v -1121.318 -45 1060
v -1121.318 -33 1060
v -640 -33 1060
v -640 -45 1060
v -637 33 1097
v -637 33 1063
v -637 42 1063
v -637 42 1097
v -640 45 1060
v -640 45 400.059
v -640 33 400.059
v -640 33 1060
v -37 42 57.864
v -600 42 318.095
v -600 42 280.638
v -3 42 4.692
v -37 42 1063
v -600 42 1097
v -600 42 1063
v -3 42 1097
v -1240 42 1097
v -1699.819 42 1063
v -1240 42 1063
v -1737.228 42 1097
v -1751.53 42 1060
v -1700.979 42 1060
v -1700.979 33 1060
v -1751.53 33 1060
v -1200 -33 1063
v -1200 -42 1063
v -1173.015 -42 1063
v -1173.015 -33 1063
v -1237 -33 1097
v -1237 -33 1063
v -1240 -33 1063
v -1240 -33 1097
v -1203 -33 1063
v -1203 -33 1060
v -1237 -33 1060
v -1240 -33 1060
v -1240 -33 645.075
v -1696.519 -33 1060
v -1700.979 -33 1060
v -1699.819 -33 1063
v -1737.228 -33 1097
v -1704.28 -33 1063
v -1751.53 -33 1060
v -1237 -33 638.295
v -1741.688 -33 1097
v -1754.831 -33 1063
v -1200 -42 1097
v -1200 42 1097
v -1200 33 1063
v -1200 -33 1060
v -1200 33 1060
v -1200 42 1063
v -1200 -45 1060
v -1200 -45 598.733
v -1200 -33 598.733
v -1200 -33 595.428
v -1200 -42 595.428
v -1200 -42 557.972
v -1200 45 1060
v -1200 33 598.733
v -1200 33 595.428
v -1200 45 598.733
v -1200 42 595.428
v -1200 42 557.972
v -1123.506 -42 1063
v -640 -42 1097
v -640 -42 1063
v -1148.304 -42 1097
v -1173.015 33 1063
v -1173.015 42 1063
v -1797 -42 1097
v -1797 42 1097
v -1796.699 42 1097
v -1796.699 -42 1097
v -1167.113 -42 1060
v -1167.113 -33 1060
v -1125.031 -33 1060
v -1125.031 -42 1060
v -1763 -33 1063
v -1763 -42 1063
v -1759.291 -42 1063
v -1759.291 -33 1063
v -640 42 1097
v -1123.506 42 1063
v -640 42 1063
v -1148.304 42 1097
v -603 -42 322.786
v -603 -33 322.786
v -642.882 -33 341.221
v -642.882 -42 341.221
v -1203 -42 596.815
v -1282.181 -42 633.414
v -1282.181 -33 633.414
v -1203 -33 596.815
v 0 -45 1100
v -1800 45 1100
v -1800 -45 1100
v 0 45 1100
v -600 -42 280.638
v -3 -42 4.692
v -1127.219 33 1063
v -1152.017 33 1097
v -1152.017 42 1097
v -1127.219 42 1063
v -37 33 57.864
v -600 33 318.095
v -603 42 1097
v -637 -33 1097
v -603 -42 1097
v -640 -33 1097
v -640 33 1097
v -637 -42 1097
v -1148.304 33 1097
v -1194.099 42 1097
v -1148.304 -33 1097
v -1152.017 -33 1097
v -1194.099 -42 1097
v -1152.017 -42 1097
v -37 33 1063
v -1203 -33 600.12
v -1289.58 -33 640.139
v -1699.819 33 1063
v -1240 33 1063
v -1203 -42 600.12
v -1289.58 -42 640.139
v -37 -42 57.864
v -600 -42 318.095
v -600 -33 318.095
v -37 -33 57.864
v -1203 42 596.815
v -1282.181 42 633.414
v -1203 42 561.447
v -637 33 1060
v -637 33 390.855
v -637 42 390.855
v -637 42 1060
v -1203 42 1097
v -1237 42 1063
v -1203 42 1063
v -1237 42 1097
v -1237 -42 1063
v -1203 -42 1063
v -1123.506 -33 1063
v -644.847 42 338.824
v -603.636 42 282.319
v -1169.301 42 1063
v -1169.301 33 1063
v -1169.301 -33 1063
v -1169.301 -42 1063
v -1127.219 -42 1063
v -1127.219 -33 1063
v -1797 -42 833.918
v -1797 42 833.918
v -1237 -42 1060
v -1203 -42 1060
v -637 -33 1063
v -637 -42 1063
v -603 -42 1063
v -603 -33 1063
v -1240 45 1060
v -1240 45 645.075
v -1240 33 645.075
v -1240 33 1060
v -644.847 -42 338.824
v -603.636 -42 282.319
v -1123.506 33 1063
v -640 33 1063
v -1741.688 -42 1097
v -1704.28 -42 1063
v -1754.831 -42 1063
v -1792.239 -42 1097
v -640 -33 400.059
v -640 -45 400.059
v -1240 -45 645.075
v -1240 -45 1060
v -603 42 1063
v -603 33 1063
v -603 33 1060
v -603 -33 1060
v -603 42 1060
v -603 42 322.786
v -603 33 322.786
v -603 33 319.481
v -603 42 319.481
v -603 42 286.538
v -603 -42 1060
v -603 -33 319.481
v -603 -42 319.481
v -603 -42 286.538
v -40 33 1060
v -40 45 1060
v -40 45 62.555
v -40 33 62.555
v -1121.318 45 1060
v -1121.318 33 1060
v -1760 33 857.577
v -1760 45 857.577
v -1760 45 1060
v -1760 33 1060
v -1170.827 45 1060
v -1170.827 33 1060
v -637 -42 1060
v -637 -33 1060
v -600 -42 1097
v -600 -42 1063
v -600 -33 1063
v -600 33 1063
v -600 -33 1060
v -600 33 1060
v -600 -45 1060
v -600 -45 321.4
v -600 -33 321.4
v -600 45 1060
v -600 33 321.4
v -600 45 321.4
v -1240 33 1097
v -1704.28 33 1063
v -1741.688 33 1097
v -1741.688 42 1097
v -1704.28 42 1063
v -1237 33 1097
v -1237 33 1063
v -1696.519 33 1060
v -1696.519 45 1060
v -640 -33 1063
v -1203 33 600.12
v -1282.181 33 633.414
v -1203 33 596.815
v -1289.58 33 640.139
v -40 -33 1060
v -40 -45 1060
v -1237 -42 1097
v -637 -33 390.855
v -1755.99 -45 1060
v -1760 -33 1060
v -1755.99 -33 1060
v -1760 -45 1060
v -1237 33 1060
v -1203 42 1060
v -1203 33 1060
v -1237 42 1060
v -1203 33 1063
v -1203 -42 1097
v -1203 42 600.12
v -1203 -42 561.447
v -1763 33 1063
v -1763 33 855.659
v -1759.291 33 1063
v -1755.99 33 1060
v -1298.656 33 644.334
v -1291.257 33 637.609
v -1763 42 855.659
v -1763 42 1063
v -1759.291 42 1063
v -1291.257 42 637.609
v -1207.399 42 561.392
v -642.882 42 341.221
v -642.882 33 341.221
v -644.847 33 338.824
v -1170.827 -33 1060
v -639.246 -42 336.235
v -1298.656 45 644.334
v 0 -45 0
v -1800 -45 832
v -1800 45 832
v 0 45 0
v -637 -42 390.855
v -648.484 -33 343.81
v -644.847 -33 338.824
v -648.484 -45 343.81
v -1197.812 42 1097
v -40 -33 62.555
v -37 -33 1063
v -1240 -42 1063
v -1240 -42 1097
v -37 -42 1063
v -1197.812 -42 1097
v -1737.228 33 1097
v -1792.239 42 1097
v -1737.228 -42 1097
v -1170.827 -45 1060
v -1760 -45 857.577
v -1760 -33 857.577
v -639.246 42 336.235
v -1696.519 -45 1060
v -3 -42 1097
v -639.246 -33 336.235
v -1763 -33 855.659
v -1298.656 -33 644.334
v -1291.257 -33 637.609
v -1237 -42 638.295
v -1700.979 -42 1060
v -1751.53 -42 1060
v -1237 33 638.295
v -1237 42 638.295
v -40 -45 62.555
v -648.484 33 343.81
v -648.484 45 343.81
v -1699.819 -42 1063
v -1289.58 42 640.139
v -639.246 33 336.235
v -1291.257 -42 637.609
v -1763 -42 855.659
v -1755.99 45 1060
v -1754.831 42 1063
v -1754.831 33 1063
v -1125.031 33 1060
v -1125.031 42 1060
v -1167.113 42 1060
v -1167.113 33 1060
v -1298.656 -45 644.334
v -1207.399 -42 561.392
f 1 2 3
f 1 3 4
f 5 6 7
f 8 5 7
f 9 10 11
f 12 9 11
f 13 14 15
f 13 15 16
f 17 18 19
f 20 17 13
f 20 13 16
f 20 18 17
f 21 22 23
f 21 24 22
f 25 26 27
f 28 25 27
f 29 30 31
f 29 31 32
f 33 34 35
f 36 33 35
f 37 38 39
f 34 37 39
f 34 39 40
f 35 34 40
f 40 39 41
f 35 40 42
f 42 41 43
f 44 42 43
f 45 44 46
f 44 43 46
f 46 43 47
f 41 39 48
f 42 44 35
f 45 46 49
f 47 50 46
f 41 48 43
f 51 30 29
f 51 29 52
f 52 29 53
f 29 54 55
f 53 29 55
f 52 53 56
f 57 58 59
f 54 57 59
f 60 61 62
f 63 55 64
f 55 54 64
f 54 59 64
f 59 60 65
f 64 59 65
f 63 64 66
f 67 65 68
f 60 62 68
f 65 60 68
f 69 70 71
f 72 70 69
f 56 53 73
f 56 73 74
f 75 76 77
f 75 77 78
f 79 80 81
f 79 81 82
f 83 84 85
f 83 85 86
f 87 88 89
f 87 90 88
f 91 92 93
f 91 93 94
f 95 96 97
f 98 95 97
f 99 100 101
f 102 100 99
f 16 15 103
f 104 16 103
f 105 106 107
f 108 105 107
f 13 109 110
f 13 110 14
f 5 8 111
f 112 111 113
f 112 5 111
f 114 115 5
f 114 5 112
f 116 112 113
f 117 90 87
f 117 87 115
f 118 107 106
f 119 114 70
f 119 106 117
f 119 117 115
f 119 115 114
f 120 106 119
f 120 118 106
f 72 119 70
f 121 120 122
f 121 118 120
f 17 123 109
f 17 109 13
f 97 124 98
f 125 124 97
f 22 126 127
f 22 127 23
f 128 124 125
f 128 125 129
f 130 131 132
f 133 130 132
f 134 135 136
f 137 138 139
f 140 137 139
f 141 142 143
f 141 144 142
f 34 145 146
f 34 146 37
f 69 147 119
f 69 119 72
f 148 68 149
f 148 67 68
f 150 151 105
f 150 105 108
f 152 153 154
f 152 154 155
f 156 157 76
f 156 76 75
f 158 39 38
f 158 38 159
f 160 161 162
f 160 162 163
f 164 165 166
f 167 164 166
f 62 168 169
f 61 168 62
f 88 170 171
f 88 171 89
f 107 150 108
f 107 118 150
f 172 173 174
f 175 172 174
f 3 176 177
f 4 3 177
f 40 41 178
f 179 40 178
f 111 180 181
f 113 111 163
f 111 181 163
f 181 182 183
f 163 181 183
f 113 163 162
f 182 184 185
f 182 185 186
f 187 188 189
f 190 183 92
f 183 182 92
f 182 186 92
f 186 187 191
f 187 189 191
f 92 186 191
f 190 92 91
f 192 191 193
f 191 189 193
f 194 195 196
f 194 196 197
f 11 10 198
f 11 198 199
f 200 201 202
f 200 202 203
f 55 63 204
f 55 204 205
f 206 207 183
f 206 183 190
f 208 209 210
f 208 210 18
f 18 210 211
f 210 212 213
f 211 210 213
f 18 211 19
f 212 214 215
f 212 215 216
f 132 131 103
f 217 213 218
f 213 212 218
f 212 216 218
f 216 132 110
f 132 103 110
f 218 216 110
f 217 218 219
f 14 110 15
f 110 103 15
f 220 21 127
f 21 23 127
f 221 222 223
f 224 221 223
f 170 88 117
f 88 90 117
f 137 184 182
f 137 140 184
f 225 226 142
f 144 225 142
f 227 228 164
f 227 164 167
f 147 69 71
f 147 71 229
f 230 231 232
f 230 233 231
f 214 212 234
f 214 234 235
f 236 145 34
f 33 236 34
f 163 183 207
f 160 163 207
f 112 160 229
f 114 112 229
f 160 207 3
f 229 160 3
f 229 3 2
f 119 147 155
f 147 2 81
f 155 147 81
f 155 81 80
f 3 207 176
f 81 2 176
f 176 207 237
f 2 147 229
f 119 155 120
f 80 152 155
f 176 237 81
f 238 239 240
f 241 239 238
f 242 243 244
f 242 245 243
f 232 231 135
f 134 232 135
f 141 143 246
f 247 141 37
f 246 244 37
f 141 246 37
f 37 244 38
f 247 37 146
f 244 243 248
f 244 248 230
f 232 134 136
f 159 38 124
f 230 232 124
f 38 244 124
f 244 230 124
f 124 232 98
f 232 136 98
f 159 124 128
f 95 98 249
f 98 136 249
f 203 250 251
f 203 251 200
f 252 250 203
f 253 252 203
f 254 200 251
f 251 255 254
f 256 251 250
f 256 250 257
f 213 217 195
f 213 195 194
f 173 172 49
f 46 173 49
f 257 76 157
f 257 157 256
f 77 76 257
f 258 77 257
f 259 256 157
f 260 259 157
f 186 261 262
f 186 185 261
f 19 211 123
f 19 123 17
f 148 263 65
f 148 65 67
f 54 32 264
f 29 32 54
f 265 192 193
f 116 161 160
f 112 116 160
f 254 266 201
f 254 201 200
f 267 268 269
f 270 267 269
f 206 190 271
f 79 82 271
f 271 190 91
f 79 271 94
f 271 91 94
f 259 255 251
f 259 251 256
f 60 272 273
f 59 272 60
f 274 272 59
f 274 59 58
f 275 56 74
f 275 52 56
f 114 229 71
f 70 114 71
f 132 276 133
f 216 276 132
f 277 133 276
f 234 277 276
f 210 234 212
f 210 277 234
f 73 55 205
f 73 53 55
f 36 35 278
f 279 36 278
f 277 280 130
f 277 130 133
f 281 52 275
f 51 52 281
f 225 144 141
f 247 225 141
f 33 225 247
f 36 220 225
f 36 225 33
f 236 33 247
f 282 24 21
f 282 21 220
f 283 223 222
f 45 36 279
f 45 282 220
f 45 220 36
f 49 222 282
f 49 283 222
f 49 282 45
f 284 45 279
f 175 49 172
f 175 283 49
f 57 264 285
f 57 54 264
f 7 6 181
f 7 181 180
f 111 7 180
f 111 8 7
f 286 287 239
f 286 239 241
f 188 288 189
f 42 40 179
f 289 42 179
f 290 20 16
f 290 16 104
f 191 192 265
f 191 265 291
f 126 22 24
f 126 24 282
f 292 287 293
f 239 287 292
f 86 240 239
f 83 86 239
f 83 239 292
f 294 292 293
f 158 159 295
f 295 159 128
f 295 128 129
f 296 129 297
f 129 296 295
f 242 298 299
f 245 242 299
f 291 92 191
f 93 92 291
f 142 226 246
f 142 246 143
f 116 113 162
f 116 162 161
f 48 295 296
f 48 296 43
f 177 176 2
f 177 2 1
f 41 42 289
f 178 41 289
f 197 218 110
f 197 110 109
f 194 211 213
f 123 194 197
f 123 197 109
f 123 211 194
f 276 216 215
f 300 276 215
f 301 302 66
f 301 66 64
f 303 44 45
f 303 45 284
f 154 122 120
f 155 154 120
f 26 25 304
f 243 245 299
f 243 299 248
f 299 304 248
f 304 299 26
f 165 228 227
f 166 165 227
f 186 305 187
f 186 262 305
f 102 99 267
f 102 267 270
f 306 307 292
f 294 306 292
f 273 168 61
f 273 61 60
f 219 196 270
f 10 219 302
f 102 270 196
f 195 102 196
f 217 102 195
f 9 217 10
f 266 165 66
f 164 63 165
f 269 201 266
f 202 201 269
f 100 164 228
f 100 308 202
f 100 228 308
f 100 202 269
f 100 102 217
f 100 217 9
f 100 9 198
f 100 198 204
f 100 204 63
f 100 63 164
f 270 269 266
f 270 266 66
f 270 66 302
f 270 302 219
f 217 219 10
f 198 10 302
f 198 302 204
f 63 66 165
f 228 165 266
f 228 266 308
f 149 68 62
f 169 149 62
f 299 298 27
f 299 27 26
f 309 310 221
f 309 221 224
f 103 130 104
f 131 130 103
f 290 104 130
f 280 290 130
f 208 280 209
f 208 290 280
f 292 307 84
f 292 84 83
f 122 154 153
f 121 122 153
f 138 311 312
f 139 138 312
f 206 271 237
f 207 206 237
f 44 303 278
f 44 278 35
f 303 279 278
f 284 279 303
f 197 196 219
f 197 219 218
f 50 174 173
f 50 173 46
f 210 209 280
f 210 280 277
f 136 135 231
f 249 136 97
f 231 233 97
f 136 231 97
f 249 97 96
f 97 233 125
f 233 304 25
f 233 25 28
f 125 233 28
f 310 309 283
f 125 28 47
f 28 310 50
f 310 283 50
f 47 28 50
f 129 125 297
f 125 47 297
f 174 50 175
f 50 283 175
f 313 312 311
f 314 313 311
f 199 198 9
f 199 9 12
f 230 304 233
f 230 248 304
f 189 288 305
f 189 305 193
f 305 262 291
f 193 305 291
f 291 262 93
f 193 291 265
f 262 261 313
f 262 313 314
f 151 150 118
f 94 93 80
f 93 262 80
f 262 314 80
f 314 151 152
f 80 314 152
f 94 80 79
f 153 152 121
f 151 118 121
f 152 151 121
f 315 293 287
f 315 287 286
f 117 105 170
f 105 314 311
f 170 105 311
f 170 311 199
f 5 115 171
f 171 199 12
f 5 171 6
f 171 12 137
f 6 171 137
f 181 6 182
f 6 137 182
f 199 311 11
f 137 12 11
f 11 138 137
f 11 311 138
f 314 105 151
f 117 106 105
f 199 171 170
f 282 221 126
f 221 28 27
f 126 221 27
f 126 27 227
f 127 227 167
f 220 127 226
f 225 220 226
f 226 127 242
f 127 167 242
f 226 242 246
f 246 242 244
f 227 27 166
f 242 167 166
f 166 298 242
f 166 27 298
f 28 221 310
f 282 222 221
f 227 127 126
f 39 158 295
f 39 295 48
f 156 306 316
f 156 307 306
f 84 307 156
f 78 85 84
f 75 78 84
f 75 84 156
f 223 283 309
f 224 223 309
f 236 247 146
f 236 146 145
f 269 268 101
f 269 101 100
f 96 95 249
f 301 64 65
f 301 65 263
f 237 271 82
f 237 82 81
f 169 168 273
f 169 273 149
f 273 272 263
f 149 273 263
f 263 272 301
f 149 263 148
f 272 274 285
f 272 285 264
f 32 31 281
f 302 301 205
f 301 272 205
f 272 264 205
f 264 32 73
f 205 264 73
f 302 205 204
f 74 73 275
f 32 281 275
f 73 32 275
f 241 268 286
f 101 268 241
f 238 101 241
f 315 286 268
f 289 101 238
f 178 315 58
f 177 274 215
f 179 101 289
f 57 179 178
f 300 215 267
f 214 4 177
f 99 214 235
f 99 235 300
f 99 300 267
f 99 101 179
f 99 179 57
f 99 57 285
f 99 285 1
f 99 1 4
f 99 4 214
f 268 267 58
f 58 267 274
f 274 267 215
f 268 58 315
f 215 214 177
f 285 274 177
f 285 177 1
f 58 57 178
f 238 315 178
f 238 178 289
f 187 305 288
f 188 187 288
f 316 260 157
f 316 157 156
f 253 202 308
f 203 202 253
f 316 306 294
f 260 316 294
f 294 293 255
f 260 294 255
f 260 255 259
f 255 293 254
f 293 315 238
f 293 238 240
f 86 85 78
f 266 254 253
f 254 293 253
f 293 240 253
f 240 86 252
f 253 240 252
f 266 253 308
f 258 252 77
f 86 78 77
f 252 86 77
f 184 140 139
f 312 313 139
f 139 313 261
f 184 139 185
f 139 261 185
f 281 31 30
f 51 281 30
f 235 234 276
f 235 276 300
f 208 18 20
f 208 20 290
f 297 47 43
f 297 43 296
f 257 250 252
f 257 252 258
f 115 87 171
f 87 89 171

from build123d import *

# Parameters (mm, degrees)
F6_W     = 90
F6_H     = 203.898897171
F7_DEPTH = 1800.001


with BuildPart() as f2:
    # F2: sweep along a path in F0
    with BuildLine(Plane.XZ) as f2_path:
        Line((0, 0), (0, 1100))
        Line((0, 1100), (-1800, 1100))
        Line((-1800, 1100), (-1800, 832))
        Line((-1800, 832), (0, 0))
    # F1 (on Top) → F2 (sweep)
    with BuildSketch(Plane.XY):
        Polygon((0, -45), (0, 0), (0, 45), (-40, 45), (-40, 33), (-37, 33), (-37, 42), (-3, 42), (-3, 0), (-3, -42), (-37, -42), (-37, -33), (-40, -33), (-40, -45), align=None)
    sweep(path=f2_path.line, transition=Transition.RIGHT)

    # F5: sweep along a path in F3
    with BuildLine(Plane.XZ) as f5_path:
        Line((-600, 1100), (-600, 277.3333333333))
        Line((-600, 277.3333333333), (-1200, 1100))
        Line((-1200, 1100), (-1200, 554.6666666667))
        Line((-1200, 554.6666666667), (-1800, 1100))
    # F4 (on face) → F5 (sweep)
    with BuildSketch(Plane.XY.offset(1100)):
        Polygon((-600, -45), (-600, 0), (-600, 45), (-640, 45), (-640, 33), (-637, 33), (-637, 42), (-603, 42), (-603, 0), (-603, -42), (-637, -42), (-637, -33), (-640, -33), (-640, -45), align=None)
    sweep(path=f5_path.line, transition=Transition.RIGHT)

    # F6 (on face) → F7 (cut, through all)
    with BuildSketch(Plane.YZ):
        with Locations((0, 1201.9494485855)):
            Rectangle(F6_W, F6_H)
    extrude(amount=-F7_DEPTH, mode=Mode.SUBTRACT)


solid = f2.part
